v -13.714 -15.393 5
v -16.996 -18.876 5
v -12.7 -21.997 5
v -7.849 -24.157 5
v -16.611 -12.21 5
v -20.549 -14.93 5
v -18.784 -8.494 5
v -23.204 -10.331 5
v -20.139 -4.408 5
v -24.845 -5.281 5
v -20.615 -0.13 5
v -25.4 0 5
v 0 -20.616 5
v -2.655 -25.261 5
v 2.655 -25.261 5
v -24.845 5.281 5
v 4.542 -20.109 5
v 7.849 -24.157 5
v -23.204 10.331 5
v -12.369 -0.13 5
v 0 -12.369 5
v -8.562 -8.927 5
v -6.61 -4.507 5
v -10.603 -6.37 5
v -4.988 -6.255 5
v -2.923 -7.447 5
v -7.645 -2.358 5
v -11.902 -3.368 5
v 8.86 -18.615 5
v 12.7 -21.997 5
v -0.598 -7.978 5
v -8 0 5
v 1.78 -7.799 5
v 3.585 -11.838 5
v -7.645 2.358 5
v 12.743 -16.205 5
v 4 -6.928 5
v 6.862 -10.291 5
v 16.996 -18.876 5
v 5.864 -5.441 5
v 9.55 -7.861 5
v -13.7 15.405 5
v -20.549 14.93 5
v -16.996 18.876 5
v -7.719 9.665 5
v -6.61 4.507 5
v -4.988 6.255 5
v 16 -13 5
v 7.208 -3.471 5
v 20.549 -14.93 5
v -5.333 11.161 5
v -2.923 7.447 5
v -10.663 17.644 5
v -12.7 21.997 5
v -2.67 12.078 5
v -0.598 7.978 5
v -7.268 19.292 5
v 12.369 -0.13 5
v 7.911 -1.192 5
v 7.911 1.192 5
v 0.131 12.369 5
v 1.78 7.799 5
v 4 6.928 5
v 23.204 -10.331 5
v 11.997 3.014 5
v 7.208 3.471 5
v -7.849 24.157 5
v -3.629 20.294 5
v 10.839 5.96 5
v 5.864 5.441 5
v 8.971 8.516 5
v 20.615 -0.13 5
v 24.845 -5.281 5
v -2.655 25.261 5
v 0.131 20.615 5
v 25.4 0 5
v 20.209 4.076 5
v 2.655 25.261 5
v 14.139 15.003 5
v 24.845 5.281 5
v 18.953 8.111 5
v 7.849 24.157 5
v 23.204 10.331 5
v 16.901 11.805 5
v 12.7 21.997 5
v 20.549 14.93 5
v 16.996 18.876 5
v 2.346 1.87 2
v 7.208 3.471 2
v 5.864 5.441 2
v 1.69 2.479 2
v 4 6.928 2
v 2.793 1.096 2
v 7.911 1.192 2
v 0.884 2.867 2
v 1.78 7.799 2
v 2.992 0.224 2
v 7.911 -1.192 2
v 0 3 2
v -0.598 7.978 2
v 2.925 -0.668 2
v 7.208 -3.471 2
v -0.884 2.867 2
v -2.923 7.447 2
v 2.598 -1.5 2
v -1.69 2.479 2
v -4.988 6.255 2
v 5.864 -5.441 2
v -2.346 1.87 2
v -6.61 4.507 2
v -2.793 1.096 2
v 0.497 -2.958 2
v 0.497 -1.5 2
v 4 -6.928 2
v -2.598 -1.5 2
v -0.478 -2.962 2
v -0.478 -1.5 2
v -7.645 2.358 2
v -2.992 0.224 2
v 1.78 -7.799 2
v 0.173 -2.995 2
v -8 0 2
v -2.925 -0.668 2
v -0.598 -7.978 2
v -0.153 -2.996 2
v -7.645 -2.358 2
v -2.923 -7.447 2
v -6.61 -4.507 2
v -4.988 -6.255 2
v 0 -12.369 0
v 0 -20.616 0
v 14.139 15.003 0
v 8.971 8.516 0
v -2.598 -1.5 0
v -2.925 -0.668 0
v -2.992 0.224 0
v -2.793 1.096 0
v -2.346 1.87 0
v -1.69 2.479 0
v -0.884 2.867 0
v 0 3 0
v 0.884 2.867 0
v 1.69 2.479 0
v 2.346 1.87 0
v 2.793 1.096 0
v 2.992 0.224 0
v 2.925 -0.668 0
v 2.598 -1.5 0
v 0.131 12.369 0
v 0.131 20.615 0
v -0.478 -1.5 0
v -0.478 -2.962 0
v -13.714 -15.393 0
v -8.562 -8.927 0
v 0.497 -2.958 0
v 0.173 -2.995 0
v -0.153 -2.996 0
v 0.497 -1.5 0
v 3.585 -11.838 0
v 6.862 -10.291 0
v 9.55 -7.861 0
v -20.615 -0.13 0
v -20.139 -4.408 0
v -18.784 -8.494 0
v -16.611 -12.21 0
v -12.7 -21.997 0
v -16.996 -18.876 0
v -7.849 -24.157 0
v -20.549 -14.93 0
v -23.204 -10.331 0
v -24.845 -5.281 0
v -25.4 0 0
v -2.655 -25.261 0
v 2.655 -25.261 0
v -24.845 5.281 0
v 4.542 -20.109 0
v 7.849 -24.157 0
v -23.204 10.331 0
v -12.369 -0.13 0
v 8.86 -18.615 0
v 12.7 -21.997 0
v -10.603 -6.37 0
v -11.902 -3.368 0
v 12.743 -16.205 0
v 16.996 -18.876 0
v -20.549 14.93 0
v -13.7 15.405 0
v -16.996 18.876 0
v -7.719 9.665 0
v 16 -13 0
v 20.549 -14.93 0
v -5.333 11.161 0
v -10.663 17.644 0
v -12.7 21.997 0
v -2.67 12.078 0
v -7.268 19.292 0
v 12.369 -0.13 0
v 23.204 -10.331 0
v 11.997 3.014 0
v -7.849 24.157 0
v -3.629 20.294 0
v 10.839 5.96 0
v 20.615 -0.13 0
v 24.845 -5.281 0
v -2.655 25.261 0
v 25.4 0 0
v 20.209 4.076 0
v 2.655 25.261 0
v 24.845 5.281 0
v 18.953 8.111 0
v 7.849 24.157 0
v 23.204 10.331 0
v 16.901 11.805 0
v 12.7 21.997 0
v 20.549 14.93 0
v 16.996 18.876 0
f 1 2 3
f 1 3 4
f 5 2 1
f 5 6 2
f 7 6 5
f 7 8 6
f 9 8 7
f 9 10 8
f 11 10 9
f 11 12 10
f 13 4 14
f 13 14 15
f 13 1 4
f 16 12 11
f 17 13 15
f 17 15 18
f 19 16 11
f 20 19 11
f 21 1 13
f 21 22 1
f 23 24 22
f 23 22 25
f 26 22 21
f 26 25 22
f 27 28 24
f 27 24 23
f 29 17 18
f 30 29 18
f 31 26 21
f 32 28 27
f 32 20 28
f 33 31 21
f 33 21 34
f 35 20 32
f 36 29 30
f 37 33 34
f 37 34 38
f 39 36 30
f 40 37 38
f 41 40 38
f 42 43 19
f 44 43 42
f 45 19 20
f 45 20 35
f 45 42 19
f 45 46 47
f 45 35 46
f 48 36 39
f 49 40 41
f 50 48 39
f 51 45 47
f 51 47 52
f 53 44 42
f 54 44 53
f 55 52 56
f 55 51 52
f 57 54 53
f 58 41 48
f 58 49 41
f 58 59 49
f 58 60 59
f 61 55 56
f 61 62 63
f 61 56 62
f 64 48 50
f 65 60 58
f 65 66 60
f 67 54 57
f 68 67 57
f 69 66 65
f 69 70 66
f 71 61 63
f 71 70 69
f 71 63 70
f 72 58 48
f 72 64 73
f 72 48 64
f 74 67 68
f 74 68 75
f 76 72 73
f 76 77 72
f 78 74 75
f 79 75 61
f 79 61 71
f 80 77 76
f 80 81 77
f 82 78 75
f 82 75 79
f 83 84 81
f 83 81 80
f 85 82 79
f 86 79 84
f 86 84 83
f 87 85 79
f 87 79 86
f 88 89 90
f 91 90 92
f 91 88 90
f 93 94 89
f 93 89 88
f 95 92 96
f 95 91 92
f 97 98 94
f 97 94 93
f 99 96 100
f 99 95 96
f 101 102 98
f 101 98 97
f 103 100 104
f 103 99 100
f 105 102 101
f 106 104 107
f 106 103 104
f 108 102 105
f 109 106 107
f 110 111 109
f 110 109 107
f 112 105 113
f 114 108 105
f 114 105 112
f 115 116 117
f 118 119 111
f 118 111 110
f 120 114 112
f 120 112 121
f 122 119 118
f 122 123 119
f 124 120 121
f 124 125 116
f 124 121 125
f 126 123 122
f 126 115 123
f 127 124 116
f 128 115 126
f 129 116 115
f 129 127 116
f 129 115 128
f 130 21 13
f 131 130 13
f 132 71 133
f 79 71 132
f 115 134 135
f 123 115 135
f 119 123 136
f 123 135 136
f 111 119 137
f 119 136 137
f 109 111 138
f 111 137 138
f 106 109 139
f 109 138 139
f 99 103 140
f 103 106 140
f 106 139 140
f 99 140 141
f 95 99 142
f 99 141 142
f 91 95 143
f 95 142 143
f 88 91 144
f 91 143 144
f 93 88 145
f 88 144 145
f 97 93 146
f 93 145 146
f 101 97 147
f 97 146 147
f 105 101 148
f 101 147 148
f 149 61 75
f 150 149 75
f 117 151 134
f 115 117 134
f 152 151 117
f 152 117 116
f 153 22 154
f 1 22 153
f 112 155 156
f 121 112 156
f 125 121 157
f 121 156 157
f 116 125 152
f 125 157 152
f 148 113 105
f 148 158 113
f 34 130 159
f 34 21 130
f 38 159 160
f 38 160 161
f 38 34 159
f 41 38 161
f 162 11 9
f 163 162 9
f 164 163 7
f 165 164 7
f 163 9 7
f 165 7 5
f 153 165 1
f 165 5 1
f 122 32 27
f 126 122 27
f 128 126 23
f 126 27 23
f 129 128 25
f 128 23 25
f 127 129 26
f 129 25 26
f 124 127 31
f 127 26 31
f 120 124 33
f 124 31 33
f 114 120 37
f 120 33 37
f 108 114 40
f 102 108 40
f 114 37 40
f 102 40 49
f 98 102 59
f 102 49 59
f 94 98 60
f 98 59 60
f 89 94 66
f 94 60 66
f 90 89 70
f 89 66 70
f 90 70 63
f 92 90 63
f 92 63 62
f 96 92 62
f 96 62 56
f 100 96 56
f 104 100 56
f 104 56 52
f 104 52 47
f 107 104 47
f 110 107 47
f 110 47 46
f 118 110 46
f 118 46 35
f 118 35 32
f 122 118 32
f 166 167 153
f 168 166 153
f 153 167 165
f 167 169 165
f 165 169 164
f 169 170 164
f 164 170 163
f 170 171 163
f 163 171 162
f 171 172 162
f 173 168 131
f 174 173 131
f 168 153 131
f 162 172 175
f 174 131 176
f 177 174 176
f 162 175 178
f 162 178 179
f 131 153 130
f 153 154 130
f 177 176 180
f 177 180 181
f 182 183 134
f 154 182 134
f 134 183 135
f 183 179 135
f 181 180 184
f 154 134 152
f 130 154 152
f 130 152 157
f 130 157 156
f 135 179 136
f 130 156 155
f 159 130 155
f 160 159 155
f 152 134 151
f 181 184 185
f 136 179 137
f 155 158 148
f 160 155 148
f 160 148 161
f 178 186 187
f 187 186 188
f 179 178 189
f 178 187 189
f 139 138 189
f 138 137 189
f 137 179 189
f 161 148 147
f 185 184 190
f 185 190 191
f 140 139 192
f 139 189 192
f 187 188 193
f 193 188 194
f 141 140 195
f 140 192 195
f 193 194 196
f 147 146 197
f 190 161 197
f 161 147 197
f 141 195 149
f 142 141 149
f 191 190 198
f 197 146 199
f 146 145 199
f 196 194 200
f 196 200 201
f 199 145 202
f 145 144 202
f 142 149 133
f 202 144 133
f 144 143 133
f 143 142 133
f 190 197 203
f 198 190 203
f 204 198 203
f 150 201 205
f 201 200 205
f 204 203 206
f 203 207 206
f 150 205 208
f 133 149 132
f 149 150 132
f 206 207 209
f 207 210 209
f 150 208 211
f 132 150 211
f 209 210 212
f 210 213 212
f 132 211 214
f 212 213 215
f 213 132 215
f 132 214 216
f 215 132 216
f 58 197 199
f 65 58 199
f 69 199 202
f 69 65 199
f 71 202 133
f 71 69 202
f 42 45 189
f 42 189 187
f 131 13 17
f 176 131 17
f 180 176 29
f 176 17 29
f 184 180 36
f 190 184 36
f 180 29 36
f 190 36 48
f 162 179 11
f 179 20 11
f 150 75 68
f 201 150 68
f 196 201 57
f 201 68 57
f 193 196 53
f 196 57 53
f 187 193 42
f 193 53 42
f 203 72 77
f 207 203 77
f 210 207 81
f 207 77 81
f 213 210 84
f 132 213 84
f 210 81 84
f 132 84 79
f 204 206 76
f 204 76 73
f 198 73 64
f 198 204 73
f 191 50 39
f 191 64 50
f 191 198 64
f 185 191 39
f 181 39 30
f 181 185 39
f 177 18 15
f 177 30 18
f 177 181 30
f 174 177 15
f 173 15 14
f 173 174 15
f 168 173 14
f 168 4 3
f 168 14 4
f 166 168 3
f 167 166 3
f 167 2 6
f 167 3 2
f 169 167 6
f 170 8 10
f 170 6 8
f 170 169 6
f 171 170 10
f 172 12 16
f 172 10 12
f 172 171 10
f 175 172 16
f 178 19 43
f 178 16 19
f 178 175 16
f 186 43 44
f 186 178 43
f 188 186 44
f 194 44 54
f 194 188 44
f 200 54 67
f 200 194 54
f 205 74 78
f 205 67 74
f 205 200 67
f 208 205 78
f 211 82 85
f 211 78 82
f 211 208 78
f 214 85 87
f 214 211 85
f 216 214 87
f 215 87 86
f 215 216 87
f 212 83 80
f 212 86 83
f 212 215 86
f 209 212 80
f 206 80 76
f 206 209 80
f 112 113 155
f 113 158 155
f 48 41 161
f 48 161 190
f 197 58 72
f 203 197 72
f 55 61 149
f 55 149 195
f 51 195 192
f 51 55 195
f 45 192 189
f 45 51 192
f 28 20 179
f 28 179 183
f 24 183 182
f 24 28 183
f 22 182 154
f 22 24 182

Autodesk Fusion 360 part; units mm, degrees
sketch "Sketch1" plane through (0, 0, 0) normal (0, 0, 1) x (1, 0, 0)
  circle A0 centre (0, 0) radius 25.4
  line L0 (-0.4775, -1.5) -> (-2.5981, -1.5)
  line L1 (0.4974, -1.5) -> (2.5981, -1.5)
  line L2 (-0.4775, -1.5) -> (-0.4775, -2.9618)
  line L3 (0.4974, -1.5) -> (0.4974, -2.9585)
  arc A1 (-0.4775, -2.9618) -> (0.4974, -2.9585) centre (0, 0) ccw
  arc A2 (2.5981, -1.5) -> (-2.5981, -1.5) centre (0, 0) ccw
  dimension "d1" = 6
  dimension "d2" = 50.8
extrude "Extrude1" add sketch "Sketch1" along normal blind 5
sketch "Sketch2" plane through (0, 0, 5) normal (0, 0, 1) x (-1, 0, 0)
  line L0 (-2.5981, 1.5) -> (-0.4974, 1.5)
  line L1 (-0.4974, 1.5) -> (-0.4974, 2.9585)
  arc A0 (0.4775, 2.9618) -> (-0.4974, 2.9585) centre (0, 0) ccw
  line L2 (0.4775, 2.9618) -> (0.4775, 1.5)
  line L3 (0.4775, 1.5) -> (2.5981, 1.5)
  arc A1 (-2.5981, 1.5) -> (2.5981, 1.5) centre (0, 0) ccw
  circle A2 centre (0, 0) radius 25.4
  circle A3 centre (0, 0) radius 8
  dimension "d6" = 16
extrude "Extrude2" cut sketch "Sketch2" against normal blind 3 contours A3
sketch "Sketch3" plane through (0, 0, 5) normal (0, 0, 1) x (-1, 0, 0)
  circle A0 centre (0, 0) radius 8
  circle A1 centre (0, 0) radius 25.4
  circle A2 centre (0, 0) radius 12.3693
  circle A3 centre (0, 0) radius 20.6155
  line L0 (12.3686, 0.1302) -> (20.6151, 0.1302)
  line L1 (7.7191, -9.6651) -> (13.7003, -15.4046)
  line L2 (-0.1309, -12.3686) -> (-0.1309, -20.6151)
  line L3 (-12.3686, 0.1298) -> (-20.6151, 0.1298)
  line L4 (0, 12.3693) -> (0, 20.6155)
  line L5 (8.5619, 8.9272) -> (13.7135, 15.3929)
  line L6 (-9.5501, 7.861) -> (-16, 13)
  line L7 (-8.971, -8.5159) -> (-14.1393, -15.0026)
extrude "Extrude3" cut sketch "Sketch3" against normal blind 5 contours A2 A3 L0 L5 | A2 A3 L1 L2 | A2 A3 L4 L6 | A2 A3 L3 L7
